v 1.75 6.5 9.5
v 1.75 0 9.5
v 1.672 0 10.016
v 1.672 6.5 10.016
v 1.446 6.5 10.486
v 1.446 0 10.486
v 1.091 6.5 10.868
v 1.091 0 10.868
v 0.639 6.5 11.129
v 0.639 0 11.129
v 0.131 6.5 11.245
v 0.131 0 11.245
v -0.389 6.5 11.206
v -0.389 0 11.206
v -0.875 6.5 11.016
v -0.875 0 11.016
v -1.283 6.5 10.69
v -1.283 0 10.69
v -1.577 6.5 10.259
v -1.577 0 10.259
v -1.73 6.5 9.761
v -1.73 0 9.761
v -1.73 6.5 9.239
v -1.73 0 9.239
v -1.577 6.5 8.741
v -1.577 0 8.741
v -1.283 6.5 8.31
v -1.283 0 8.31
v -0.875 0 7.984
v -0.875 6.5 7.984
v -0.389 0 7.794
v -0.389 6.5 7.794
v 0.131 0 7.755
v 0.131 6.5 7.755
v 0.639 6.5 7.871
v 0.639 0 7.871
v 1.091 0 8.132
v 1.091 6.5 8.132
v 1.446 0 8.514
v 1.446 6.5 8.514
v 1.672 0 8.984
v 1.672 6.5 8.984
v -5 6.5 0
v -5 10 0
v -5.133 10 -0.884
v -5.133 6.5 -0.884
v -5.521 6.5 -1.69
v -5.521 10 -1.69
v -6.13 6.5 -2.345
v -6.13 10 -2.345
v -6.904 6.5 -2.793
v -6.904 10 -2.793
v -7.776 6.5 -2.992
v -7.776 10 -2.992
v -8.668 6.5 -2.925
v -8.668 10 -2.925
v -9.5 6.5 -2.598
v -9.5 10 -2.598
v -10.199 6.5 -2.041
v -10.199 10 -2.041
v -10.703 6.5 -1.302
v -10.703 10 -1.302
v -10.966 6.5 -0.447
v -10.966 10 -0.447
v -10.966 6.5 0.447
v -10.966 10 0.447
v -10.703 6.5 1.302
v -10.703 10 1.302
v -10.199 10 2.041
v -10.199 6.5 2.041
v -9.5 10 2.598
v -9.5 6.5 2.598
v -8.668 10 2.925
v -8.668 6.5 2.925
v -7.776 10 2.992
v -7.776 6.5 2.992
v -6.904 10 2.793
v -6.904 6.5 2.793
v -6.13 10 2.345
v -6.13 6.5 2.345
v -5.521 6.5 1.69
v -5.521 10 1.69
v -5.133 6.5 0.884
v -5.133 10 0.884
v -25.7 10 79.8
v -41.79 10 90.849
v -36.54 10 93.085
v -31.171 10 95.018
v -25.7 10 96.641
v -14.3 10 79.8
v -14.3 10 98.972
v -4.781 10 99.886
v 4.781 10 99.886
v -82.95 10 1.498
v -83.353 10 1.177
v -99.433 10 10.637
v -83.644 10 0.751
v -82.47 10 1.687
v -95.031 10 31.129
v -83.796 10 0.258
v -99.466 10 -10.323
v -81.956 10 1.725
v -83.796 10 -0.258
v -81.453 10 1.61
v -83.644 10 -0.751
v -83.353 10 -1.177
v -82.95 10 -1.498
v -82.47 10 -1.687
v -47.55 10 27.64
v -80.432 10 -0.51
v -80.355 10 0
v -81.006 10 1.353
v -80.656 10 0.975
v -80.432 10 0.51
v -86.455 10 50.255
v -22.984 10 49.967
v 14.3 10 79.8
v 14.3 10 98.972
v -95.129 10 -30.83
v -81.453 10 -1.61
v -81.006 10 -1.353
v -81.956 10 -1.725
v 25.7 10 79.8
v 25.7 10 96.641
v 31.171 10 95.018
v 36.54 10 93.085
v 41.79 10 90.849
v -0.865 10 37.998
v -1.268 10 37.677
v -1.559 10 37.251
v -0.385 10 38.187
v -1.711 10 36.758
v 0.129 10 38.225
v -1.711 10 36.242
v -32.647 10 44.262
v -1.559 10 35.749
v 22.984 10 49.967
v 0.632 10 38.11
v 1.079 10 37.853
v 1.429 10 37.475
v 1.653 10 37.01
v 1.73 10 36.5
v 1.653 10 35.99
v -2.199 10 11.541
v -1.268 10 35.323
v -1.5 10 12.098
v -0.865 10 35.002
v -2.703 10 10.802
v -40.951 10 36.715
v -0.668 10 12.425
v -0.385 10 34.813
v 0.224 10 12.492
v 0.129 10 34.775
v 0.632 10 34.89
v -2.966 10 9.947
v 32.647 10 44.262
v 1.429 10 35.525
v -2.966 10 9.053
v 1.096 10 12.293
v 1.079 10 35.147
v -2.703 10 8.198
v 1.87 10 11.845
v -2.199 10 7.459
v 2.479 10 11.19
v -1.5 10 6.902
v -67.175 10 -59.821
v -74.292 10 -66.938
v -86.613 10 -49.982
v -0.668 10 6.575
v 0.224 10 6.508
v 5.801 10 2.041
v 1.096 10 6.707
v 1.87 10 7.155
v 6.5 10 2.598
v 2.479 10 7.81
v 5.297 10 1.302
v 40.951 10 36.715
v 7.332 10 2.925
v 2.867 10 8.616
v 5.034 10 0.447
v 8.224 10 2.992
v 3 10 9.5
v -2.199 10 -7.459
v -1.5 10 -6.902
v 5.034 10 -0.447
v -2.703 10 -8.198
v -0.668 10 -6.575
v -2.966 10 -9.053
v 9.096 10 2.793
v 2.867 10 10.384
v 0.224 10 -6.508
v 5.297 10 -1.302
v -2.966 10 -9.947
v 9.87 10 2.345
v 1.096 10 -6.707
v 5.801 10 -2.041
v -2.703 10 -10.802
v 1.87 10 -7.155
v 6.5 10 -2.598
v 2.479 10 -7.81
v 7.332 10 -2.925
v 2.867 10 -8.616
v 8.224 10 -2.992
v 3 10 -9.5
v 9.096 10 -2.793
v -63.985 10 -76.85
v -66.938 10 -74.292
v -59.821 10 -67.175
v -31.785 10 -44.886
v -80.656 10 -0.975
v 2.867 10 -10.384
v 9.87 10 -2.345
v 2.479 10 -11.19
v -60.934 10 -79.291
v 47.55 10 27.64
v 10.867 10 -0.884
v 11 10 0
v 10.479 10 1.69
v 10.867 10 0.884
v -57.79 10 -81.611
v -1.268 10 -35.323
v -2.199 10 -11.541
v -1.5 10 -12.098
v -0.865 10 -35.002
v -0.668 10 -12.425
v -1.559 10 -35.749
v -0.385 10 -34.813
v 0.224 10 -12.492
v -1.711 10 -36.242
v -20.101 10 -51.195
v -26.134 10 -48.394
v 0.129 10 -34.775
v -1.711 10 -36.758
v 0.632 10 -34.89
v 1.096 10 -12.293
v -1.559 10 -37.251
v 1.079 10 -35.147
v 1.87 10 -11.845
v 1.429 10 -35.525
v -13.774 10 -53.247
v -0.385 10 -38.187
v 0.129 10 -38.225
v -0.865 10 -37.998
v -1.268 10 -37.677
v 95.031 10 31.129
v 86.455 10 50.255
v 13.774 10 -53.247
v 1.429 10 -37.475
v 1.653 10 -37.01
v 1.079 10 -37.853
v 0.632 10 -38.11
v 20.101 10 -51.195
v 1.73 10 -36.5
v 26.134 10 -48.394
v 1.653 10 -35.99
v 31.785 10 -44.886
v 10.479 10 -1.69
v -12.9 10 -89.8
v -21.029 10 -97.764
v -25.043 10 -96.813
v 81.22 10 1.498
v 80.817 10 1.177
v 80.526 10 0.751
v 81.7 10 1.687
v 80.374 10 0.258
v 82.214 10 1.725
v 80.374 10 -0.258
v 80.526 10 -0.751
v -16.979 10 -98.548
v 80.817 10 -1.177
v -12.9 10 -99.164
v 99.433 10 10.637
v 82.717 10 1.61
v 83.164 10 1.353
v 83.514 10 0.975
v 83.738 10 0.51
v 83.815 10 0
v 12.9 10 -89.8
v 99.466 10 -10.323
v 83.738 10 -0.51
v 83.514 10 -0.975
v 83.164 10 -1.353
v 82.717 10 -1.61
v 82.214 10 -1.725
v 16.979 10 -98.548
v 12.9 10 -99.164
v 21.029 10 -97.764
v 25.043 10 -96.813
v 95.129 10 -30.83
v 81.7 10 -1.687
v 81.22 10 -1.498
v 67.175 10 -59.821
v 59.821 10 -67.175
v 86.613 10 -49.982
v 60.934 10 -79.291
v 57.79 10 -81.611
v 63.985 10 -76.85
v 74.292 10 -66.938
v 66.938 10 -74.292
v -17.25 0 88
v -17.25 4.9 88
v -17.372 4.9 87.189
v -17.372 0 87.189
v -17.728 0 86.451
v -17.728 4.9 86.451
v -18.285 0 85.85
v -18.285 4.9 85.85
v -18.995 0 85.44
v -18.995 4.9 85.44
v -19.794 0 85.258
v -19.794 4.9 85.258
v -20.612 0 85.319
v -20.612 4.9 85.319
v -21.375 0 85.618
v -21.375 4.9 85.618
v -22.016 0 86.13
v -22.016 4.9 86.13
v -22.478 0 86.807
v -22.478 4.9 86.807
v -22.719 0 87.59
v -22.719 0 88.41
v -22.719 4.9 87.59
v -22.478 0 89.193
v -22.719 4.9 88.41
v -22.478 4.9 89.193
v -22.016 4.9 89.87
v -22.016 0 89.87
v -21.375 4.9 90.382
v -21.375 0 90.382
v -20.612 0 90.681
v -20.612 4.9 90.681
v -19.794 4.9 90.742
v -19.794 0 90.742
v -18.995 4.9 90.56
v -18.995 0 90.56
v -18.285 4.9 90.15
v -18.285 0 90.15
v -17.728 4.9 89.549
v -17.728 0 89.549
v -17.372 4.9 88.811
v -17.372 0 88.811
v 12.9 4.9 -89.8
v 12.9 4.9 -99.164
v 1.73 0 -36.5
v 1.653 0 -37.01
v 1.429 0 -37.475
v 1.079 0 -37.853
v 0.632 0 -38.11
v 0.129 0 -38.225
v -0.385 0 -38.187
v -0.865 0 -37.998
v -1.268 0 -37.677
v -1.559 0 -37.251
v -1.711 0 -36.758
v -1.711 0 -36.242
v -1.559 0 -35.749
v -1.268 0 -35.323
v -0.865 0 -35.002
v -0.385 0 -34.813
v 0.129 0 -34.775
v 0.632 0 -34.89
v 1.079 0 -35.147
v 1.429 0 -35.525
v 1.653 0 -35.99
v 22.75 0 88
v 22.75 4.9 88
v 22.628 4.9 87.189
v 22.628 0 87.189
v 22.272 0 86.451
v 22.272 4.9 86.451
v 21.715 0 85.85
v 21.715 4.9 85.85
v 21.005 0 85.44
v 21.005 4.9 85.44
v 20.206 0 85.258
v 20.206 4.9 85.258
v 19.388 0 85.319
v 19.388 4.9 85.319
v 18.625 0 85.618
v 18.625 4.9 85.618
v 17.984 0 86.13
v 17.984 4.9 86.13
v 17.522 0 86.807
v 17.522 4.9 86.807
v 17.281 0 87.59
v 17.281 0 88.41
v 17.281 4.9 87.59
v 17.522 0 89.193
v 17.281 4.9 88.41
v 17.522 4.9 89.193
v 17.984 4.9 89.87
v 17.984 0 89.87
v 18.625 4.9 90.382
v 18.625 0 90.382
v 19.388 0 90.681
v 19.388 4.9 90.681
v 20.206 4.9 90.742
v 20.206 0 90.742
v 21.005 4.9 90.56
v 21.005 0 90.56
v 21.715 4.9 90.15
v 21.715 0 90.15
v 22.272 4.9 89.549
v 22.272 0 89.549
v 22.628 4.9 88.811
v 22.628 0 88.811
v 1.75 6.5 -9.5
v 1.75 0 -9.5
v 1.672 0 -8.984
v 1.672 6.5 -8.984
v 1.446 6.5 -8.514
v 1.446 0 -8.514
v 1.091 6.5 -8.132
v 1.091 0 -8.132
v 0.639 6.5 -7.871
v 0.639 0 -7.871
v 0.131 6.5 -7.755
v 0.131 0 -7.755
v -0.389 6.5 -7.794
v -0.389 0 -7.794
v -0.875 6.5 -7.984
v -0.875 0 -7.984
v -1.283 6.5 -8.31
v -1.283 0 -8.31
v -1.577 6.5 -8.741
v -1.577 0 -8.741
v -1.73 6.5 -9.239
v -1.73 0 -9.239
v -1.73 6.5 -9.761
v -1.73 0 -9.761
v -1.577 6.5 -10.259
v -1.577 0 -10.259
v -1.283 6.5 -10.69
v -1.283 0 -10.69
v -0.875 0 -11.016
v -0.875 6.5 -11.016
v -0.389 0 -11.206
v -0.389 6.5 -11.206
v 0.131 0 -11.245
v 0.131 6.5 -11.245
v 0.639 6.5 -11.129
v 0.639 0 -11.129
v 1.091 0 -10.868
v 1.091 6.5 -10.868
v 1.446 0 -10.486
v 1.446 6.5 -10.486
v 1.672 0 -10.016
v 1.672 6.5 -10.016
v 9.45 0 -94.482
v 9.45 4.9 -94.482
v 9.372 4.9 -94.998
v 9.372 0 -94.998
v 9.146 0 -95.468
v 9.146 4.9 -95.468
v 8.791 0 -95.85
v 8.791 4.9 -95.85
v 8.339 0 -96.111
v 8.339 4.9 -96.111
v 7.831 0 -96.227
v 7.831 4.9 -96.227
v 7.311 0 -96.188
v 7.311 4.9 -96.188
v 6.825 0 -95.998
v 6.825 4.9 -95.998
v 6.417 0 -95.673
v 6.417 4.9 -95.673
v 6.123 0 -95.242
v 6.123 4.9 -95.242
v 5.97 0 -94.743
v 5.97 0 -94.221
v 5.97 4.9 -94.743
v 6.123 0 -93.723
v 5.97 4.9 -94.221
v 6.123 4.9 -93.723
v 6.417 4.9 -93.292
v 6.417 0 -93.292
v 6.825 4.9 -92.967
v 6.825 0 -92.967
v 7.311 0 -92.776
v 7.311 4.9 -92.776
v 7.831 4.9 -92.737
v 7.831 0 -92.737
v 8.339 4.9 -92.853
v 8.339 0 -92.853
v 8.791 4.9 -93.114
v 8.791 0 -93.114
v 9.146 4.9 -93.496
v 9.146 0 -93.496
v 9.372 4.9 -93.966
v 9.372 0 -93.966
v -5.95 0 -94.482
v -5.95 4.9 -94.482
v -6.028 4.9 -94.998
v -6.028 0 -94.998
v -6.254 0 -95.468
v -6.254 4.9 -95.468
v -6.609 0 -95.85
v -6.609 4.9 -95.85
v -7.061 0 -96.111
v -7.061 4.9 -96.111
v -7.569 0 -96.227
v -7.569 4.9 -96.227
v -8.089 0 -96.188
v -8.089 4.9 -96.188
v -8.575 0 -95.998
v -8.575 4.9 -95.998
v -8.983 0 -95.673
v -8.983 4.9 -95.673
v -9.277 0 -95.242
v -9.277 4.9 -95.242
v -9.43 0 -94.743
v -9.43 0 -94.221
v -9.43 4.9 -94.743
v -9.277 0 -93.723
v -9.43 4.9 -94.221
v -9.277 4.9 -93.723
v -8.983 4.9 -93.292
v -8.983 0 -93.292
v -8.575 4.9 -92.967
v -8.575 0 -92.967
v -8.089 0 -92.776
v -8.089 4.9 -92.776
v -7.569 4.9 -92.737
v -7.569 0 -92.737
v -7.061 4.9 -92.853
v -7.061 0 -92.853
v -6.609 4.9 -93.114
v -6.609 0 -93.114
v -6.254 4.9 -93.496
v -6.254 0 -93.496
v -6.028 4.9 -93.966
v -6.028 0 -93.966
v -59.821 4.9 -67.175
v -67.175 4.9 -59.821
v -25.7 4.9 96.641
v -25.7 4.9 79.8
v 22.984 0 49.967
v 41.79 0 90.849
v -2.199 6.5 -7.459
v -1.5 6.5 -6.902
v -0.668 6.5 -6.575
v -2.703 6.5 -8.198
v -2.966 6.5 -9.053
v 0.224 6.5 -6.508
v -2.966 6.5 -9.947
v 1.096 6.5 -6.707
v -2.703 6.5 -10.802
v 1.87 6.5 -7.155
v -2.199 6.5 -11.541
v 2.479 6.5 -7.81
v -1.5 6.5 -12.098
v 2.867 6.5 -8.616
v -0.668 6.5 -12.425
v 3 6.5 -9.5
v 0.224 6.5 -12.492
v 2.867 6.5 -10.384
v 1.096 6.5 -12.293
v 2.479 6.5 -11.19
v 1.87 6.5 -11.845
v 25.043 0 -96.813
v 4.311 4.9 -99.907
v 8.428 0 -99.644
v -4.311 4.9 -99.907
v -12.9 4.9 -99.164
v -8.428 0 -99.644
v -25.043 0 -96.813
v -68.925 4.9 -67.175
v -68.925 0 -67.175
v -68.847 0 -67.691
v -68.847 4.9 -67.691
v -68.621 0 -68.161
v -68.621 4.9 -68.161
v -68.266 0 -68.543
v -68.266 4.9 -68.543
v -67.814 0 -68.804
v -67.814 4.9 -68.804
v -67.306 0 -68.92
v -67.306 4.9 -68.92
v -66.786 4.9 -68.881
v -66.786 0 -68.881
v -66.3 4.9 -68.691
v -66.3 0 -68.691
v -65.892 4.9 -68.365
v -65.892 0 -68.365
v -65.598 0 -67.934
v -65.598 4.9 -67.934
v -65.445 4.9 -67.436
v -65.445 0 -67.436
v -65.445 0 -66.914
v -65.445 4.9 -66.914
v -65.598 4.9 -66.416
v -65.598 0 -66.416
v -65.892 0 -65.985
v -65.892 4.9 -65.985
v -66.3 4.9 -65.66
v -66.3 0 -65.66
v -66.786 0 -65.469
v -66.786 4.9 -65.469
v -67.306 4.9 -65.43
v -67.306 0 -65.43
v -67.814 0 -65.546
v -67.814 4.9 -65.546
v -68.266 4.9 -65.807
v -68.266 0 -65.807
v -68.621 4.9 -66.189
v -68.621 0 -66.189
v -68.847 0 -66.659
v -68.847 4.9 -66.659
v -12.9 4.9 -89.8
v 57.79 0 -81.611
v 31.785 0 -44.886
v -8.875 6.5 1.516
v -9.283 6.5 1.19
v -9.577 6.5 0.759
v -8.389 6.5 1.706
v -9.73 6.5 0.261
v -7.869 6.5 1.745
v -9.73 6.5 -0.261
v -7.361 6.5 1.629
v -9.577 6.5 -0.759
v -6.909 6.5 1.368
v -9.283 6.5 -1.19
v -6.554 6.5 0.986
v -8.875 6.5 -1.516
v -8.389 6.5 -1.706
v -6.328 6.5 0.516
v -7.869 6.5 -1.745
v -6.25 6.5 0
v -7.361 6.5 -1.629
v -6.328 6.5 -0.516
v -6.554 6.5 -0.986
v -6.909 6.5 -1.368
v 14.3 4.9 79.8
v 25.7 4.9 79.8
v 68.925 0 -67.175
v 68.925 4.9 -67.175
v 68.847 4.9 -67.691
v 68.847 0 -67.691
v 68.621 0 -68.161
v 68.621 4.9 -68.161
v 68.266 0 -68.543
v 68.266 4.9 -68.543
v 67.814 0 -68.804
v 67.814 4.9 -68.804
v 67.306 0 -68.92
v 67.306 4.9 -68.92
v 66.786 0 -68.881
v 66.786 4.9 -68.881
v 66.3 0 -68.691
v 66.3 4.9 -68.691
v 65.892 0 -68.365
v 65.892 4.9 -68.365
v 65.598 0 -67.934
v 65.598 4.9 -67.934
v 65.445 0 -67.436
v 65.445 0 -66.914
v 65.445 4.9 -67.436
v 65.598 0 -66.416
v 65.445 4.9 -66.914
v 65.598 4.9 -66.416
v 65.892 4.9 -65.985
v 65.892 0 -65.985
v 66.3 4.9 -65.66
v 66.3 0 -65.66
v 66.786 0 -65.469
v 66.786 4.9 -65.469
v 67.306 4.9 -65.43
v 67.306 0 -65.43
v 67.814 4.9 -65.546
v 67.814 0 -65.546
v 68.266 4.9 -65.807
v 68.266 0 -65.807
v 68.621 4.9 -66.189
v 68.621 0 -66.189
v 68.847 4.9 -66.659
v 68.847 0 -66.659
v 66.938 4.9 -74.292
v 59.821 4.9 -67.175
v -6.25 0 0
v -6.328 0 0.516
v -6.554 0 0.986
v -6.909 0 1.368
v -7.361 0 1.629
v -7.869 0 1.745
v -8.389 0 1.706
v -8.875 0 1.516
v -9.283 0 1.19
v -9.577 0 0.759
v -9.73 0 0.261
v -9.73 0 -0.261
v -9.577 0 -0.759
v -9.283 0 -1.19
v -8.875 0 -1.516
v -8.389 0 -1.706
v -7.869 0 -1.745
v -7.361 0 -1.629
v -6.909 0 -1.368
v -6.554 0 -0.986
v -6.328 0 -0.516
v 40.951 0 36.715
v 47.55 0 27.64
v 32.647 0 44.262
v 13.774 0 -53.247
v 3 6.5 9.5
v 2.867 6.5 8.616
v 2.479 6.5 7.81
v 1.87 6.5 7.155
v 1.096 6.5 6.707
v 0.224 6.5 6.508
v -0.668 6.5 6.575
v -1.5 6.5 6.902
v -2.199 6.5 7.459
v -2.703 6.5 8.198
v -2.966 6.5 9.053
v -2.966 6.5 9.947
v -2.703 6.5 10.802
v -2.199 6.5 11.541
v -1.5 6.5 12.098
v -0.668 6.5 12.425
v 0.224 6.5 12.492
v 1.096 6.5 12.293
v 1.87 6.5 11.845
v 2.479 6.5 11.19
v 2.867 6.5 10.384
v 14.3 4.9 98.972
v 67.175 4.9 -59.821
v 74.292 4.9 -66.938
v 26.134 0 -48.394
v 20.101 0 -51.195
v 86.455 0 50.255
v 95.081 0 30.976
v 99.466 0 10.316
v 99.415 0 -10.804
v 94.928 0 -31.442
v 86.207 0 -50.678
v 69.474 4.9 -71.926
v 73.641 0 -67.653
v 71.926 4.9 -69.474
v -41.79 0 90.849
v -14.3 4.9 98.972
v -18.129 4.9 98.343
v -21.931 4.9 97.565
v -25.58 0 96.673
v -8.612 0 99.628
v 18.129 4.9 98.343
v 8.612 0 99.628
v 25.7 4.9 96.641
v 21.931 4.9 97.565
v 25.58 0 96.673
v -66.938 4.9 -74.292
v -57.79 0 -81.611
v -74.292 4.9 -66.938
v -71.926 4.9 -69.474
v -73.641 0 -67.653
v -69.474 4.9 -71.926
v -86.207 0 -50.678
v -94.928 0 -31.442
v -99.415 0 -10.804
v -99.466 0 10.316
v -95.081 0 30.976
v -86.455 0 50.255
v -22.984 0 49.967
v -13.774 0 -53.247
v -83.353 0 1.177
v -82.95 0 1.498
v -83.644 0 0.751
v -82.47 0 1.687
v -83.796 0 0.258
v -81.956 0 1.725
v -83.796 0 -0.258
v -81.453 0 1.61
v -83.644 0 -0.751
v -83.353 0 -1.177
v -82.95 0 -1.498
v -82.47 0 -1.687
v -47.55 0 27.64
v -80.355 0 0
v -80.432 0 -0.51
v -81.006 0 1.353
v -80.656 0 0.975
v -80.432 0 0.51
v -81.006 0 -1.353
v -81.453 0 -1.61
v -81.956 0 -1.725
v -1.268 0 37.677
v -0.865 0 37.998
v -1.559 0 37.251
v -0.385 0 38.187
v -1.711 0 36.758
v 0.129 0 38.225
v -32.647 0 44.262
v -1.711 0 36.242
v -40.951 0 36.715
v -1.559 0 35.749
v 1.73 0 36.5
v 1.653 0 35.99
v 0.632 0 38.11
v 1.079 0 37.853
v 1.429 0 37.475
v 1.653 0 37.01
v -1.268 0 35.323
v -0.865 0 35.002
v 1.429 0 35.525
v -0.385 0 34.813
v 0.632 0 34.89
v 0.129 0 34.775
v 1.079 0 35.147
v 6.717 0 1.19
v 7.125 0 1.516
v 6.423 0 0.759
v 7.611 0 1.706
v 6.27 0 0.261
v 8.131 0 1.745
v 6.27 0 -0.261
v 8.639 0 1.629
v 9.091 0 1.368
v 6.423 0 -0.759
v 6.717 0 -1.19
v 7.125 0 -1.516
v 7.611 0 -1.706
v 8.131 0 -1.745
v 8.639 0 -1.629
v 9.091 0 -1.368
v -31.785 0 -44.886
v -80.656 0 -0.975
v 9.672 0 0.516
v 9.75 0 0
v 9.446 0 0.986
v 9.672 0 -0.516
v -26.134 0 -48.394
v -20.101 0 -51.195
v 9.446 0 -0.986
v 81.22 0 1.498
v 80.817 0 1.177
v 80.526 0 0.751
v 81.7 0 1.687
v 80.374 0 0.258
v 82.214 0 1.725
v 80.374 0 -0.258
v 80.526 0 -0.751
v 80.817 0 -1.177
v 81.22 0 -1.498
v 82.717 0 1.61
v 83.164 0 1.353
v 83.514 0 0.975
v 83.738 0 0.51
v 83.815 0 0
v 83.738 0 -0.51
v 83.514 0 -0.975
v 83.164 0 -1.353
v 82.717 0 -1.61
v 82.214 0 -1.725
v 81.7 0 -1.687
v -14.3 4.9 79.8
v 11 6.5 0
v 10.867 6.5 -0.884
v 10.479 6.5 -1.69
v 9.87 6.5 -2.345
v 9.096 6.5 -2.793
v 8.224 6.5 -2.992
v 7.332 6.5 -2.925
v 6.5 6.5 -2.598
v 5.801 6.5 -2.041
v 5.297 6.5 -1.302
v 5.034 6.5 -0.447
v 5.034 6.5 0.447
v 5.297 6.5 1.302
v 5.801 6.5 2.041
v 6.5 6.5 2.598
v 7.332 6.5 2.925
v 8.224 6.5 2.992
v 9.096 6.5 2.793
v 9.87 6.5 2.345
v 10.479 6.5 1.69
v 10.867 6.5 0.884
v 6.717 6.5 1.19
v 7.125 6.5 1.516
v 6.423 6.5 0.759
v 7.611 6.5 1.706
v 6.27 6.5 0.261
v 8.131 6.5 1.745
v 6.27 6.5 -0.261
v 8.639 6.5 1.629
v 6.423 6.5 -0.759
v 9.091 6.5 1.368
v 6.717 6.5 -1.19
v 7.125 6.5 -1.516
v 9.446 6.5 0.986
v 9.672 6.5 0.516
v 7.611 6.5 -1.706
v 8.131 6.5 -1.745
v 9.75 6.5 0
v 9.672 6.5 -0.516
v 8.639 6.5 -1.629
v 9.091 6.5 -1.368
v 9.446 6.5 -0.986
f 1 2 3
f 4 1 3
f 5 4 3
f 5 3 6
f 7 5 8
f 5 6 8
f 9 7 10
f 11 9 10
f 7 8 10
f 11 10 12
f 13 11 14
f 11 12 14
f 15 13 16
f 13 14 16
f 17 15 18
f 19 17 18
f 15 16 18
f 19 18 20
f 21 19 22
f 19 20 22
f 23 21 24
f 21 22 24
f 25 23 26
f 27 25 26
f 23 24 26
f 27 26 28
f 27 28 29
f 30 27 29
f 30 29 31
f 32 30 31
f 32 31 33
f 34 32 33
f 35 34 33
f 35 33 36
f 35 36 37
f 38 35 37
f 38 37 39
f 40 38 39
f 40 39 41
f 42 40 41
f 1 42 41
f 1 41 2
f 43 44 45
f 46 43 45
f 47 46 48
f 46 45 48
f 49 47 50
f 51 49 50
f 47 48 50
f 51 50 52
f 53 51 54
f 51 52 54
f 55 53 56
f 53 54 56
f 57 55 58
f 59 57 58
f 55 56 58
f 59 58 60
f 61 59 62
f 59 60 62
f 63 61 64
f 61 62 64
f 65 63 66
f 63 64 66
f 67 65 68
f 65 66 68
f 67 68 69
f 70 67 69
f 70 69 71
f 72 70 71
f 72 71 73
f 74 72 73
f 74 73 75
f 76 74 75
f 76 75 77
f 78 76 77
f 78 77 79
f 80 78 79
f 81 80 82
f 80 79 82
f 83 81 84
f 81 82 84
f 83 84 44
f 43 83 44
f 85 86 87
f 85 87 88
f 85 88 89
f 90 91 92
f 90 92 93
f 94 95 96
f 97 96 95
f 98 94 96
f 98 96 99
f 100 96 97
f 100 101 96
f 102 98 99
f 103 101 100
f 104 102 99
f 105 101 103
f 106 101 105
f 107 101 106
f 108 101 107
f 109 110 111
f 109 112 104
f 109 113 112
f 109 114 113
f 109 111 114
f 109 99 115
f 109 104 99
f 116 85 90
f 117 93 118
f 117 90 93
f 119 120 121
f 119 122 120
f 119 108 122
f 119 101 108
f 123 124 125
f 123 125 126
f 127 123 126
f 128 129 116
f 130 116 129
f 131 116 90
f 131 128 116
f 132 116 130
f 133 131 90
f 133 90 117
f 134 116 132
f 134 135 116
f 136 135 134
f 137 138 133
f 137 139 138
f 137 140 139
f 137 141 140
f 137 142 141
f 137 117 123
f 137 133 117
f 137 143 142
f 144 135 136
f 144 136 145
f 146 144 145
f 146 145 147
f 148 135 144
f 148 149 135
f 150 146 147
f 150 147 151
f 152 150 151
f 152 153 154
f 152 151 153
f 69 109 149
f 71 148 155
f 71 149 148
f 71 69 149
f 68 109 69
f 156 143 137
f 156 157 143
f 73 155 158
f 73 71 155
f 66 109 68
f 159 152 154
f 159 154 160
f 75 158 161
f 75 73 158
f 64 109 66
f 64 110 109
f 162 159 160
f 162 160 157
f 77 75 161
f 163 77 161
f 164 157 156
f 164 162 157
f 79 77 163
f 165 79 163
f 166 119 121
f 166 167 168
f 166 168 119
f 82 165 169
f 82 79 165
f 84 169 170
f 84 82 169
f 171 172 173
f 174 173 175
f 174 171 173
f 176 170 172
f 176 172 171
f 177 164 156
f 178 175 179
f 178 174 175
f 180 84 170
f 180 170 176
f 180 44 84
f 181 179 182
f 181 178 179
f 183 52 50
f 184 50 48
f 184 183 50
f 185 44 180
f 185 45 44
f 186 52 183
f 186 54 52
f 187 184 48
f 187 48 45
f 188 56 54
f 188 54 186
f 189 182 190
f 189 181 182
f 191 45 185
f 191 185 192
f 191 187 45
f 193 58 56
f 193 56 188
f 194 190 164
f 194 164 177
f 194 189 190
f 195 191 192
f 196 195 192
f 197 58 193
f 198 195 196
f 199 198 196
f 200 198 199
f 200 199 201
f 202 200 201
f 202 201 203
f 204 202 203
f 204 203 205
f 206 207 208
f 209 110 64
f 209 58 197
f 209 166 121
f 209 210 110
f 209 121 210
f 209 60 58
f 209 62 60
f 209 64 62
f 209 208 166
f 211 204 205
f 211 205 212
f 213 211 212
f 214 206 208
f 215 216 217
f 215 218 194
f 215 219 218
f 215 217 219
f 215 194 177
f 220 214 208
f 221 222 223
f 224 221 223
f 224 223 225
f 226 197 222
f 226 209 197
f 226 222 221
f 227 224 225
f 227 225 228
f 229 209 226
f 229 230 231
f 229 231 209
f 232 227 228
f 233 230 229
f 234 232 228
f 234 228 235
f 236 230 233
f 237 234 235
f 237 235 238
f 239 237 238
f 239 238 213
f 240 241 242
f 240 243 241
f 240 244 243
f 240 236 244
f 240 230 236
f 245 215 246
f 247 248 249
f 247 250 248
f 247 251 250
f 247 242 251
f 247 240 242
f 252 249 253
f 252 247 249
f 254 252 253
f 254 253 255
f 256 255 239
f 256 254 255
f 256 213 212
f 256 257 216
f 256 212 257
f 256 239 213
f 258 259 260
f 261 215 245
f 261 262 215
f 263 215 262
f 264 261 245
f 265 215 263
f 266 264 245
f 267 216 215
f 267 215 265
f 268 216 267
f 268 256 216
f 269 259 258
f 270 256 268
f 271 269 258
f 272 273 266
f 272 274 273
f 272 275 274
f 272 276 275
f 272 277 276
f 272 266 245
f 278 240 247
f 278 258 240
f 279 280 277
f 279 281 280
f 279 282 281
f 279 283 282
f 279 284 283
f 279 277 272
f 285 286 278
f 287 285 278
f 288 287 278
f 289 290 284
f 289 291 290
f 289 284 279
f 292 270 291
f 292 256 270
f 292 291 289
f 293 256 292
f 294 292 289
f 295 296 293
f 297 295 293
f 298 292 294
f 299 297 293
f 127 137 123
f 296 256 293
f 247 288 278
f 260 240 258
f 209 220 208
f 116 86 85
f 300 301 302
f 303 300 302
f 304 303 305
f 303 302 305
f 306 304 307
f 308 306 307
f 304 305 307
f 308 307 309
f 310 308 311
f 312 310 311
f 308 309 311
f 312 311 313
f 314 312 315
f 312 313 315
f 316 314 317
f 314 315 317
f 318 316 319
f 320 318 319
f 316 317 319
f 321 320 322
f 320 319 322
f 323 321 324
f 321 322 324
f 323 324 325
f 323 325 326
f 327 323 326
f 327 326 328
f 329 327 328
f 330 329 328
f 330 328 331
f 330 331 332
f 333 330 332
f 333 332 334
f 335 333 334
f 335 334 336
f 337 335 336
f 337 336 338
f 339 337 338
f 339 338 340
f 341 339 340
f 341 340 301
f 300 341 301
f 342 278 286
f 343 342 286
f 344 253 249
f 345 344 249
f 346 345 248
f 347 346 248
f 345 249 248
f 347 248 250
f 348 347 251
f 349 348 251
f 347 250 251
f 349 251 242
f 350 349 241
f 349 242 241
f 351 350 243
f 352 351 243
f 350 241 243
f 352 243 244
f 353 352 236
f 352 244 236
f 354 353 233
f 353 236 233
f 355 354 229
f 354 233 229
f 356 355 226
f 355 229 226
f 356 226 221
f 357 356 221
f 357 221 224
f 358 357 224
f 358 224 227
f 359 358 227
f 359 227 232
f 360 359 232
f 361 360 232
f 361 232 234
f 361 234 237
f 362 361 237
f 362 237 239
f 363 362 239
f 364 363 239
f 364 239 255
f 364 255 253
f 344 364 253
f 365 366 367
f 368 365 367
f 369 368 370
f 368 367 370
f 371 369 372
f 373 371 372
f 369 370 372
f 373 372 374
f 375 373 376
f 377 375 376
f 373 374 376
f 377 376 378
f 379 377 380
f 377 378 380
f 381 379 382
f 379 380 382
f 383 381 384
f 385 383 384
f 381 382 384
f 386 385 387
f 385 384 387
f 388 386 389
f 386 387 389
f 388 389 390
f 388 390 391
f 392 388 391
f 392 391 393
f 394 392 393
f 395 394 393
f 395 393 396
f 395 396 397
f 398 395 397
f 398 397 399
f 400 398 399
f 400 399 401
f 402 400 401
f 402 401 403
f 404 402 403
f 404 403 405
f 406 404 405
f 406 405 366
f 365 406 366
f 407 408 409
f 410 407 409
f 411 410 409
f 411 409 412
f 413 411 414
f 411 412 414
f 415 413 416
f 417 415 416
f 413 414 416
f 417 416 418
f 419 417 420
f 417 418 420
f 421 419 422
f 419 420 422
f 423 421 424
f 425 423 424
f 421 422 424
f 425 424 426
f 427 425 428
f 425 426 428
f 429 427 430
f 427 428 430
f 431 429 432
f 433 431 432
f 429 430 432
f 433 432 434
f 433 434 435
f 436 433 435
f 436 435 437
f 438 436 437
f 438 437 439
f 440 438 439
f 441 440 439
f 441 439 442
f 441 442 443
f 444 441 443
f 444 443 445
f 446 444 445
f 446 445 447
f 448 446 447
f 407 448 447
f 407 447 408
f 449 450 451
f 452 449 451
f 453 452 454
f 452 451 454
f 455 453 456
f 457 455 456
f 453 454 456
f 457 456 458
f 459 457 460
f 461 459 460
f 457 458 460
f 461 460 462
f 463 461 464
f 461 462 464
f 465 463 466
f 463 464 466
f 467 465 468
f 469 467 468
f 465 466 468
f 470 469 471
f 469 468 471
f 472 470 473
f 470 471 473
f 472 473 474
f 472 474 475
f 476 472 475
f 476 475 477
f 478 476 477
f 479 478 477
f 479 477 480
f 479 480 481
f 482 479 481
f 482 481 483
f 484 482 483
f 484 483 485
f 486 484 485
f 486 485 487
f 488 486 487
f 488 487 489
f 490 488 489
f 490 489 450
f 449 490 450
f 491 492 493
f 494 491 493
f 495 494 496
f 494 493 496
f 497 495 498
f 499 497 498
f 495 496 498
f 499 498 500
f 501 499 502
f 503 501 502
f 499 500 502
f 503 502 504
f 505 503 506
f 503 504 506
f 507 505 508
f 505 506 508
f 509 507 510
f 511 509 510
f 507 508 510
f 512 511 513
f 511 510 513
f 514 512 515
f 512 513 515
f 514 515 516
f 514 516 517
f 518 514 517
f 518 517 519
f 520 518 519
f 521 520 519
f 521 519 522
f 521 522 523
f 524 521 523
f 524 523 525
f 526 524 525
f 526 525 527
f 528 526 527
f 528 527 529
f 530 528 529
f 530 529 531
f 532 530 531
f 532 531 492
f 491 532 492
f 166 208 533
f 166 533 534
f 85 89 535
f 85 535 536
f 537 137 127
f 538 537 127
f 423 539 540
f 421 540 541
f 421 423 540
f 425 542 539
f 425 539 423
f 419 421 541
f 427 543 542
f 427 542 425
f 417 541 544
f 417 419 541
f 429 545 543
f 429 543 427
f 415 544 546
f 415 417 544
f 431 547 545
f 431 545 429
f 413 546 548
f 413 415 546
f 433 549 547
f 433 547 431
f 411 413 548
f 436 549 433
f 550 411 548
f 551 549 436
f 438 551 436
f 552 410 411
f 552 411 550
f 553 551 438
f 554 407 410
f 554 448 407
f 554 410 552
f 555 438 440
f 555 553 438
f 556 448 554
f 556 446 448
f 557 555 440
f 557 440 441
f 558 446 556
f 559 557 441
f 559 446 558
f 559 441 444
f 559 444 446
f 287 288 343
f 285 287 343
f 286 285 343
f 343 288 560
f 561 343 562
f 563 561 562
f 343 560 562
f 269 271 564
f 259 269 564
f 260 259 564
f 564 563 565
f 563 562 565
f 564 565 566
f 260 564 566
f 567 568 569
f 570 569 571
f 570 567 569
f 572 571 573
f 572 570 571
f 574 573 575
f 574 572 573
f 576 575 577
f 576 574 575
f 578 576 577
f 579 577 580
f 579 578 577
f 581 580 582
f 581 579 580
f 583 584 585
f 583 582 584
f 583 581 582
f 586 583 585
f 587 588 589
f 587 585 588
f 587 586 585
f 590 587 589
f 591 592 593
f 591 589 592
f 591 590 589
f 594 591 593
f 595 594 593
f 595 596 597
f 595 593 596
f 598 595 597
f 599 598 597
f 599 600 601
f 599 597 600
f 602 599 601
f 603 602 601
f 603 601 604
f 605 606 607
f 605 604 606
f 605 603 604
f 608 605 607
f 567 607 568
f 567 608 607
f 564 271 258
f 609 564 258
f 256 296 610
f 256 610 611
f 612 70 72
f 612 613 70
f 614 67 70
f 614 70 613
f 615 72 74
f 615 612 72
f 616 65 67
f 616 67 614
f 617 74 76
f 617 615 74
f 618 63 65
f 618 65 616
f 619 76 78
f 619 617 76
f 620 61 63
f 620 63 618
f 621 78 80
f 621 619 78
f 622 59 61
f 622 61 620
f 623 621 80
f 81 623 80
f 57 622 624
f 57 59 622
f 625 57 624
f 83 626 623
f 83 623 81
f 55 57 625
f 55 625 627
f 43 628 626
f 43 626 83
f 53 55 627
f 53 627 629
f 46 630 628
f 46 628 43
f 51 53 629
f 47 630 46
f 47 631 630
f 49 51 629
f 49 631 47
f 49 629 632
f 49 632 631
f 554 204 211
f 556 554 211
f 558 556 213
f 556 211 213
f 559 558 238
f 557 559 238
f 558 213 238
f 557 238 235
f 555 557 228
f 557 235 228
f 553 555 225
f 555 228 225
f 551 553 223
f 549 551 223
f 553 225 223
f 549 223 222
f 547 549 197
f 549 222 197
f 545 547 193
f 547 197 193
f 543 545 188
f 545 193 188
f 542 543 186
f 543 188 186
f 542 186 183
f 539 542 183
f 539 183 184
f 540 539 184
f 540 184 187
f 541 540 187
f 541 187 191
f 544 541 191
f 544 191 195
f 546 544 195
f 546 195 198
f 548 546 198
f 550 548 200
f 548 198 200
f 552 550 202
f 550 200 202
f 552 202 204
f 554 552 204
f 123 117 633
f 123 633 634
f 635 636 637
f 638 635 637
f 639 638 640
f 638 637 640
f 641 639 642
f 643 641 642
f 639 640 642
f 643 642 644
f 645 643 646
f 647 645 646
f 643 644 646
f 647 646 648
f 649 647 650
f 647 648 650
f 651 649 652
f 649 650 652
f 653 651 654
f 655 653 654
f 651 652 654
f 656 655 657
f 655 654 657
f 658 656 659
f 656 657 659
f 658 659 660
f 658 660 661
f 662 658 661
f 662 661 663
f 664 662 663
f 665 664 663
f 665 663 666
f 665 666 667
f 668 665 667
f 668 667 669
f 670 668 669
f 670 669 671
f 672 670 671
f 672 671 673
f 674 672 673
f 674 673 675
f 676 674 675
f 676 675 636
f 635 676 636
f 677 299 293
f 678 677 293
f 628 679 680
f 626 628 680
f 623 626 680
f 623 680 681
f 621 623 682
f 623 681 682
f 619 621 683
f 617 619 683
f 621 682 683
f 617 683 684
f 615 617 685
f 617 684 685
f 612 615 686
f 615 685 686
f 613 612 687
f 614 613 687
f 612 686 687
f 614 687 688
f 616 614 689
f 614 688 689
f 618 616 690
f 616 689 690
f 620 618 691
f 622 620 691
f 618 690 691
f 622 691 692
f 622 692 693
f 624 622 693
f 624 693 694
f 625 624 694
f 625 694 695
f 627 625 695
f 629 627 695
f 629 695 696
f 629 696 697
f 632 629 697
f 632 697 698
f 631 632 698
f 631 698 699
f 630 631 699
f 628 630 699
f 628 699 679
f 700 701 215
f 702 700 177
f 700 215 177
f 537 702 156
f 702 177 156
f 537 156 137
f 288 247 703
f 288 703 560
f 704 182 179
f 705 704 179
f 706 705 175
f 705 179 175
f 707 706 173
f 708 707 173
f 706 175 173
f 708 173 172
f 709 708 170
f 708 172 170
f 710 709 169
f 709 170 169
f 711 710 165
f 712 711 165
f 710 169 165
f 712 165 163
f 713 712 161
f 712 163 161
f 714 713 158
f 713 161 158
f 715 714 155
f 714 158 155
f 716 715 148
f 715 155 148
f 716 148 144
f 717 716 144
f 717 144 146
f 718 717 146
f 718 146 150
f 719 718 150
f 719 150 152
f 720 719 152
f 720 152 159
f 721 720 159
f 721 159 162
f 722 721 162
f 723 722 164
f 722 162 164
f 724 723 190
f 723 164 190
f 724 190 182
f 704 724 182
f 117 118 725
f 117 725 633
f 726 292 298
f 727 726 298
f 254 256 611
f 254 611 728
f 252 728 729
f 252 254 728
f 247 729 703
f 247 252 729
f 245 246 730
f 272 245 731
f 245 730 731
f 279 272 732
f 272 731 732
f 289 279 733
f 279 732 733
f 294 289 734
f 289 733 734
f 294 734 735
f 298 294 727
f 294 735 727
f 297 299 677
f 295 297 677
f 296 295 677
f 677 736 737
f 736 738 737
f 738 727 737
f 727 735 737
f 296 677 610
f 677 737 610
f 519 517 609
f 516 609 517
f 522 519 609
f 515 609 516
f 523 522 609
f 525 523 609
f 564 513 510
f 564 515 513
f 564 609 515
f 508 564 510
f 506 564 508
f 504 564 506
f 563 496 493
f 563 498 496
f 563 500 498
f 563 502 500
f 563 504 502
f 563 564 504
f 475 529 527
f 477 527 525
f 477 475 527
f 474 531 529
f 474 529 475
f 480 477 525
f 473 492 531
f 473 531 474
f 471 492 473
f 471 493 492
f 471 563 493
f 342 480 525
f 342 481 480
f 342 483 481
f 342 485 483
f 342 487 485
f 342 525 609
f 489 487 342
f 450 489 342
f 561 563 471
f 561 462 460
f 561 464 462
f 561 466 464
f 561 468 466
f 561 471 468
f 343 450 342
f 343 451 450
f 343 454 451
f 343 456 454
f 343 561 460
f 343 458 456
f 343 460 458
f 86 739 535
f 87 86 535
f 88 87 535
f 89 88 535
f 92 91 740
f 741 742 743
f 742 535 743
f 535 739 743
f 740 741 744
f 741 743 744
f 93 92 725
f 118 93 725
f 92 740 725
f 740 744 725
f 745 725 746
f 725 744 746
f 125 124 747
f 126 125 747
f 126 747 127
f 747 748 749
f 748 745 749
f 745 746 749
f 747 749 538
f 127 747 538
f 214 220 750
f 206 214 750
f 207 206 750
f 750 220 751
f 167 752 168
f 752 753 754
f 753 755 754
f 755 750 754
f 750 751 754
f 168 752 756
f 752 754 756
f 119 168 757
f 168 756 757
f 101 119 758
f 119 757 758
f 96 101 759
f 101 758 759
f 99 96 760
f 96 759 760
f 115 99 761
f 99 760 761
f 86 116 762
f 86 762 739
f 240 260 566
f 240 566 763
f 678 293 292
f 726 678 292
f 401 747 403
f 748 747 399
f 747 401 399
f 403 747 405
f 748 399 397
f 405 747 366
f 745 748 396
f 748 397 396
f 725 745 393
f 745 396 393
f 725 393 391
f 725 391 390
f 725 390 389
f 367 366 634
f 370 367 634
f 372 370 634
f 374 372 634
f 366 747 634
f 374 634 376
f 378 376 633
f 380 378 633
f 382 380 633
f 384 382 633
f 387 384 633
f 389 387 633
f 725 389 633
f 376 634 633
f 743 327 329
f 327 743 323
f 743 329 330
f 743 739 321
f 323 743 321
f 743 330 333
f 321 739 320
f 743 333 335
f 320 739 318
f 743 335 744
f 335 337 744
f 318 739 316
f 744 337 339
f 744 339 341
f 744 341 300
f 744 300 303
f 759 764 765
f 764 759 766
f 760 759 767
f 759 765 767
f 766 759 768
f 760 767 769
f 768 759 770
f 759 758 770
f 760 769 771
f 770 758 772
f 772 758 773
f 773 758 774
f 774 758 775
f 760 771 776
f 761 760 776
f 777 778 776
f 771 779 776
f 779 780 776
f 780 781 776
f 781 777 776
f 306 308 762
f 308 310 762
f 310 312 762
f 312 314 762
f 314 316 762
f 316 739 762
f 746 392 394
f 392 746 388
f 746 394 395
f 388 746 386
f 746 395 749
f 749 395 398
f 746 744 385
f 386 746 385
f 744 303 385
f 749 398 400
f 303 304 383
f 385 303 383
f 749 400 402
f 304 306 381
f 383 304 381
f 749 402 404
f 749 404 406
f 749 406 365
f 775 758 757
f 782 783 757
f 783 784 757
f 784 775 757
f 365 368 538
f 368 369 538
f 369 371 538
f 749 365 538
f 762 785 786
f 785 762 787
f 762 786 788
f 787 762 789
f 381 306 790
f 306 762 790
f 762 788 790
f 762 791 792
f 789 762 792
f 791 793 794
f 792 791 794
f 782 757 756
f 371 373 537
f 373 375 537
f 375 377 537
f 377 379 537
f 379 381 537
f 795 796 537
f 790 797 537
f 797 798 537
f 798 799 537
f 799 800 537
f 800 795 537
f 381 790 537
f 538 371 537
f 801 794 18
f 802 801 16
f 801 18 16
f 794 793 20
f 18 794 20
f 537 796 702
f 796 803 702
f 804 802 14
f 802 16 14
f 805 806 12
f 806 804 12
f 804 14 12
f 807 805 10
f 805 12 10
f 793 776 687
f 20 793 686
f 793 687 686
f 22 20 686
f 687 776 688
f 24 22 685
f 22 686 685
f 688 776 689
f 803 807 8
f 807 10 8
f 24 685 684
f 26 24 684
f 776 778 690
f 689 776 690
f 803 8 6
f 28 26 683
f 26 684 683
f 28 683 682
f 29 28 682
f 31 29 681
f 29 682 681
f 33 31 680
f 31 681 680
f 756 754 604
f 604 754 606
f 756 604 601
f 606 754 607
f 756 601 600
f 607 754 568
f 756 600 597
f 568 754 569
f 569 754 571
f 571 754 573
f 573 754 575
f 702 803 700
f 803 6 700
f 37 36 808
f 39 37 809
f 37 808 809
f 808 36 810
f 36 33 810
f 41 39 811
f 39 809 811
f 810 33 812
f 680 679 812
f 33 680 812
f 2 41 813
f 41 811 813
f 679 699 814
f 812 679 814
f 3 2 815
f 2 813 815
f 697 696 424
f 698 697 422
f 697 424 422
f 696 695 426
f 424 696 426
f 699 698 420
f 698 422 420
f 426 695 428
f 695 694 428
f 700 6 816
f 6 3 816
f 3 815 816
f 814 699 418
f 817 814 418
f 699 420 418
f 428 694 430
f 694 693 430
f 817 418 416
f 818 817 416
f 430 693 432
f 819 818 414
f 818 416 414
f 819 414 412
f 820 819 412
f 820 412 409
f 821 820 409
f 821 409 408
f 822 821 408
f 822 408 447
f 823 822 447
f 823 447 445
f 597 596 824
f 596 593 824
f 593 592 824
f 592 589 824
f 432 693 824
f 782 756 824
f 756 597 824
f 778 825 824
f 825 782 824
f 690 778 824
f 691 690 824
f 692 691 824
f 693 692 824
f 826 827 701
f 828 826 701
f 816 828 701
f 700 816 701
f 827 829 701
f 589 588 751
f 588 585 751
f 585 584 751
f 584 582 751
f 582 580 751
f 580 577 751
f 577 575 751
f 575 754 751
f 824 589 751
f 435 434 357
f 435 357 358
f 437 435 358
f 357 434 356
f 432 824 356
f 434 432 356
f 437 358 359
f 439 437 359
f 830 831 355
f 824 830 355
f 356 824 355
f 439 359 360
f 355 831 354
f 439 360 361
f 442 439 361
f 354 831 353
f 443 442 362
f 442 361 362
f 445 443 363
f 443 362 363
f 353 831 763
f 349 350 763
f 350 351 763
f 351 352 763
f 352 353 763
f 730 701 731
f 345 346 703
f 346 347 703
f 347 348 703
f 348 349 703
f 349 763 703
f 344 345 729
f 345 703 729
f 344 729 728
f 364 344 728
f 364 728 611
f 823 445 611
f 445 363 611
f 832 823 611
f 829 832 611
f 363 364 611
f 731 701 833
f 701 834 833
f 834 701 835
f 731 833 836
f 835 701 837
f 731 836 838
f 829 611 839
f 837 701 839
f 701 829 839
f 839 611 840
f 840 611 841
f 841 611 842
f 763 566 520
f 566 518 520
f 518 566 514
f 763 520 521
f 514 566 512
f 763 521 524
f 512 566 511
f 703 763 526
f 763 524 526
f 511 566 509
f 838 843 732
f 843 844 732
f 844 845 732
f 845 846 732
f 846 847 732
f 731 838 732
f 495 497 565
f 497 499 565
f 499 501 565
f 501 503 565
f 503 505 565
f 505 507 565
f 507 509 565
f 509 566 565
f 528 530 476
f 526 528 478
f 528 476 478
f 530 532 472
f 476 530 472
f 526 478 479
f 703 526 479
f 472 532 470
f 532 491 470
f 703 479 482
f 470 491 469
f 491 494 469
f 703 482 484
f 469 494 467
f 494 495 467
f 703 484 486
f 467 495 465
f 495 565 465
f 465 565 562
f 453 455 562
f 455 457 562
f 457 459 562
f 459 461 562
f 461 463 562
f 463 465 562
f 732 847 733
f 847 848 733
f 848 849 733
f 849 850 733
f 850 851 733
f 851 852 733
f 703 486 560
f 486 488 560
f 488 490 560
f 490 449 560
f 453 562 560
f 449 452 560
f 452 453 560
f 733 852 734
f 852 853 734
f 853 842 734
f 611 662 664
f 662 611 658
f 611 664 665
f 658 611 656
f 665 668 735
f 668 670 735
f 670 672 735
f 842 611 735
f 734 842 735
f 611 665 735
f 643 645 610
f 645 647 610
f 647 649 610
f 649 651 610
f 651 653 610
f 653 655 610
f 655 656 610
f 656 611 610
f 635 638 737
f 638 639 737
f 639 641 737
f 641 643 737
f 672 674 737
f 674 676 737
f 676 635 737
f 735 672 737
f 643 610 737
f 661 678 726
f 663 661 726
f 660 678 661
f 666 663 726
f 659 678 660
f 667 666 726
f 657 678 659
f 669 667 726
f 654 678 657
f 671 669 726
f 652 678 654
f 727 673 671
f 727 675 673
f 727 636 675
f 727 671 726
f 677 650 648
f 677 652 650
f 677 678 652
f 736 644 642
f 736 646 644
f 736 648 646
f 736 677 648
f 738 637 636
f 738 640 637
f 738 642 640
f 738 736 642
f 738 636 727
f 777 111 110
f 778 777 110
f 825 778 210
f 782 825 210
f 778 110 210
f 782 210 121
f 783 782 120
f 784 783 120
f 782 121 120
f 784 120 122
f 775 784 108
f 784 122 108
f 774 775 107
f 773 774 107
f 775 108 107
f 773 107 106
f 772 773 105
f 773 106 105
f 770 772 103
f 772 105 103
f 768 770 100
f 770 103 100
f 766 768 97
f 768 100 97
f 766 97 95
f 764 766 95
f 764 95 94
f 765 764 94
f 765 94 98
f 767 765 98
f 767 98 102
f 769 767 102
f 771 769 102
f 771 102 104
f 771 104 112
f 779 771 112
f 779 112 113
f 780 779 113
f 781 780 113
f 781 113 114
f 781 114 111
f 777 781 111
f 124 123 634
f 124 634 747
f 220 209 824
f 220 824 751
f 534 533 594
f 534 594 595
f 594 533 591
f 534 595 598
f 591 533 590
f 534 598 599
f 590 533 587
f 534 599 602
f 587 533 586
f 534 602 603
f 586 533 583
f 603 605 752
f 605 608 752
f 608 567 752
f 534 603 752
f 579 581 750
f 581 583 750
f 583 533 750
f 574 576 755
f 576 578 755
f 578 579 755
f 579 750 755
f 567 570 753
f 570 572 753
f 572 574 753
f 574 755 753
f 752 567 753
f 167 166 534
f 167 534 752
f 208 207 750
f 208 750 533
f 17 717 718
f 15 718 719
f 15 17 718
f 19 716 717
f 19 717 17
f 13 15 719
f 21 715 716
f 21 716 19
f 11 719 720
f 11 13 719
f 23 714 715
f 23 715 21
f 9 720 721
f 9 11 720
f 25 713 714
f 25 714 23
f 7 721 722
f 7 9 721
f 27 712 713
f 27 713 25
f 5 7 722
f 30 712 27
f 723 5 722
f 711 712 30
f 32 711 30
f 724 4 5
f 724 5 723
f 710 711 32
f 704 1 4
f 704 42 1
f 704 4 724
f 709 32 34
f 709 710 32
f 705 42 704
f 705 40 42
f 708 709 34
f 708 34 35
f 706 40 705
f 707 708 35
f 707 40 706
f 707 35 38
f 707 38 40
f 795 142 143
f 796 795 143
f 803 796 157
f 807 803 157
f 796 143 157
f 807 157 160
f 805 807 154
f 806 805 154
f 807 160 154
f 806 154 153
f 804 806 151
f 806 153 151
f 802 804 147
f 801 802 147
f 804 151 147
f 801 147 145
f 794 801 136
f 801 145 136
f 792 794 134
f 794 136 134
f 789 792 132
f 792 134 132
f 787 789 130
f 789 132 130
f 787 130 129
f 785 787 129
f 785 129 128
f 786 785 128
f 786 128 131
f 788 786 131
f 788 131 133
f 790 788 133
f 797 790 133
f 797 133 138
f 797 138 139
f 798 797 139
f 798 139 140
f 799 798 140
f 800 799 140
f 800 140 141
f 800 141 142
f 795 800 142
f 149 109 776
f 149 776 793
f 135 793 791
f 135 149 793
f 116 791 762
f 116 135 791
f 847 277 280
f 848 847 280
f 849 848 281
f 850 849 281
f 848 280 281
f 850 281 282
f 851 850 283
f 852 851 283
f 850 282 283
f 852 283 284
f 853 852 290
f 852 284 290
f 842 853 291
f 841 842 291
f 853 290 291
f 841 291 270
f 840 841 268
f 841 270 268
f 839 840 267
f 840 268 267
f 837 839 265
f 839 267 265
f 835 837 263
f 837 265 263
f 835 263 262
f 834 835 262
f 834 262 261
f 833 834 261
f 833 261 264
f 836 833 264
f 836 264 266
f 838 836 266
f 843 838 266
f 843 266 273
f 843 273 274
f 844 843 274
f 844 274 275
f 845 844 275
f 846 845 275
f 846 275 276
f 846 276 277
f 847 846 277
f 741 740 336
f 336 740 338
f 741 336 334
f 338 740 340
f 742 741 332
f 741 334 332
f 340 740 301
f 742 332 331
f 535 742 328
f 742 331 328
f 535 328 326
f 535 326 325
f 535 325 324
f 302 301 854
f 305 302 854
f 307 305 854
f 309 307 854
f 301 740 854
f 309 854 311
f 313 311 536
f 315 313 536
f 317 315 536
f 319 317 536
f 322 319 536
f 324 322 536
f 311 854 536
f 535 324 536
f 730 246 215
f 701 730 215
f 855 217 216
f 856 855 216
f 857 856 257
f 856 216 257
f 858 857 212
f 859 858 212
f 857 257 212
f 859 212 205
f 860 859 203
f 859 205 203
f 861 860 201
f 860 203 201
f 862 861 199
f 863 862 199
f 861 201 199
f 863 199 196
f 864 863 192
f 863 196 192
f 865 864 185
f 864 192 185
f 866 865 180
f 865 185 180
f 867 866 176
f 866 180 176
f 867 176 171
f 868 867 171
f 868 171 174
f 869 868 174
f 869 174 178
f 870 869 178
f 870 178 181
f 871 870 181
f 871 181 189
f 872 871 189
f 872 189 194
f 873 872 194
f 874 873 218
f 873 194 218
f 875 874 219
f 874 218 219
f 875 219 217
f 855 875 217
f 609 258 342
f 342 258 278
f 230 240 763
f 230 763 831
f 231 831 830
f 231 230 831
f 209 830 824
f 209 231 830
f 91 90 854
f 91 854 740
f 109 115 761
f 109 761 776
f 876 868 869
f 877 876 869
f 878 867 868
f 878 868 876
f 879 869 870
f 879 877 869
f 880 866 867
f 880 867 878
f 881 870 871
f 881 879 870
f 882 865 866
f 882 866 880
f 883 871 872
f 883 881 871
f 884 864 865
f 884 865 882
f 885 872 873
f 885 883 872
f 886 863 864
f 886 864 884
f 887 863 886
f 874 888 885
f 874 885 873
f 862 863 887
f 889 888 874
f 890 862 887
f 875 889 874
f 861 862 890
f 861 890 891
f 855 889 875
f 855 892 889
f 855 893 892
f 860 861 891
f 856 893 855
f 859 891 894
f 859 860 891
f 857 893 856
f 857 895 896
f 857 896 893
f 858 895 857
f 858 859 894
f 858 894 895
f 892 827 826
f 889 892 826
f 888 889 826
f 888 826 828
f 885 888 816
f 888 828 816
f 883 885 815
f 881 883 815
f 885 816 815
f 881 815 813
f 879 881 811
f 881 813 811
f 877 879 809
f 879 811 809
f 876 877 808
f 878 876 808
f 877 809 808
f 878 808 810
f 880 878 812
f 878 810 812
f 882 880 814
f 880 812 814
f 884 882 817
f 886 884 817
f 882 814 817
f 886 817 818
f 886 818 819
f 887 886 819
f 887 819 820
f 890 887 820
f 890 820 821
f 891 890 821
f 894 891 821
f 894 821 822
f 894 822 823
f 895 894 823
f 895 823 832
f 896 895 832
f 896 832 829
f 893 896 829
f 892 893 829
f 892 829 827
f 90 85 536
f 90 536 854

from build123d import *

# Parameters (mm, degrees)
SKETCH1_R           = 100
BOSS_EXTRUDE1_DEPTH = 10
SKETCH4_R           = 1.73
CUT_EXTRUDE2_DEPTH  = 11
SKETCH6_R           = 1.75
CUT_EXTRUDE3_DEPTH  = 10
SKETCH7_R           = 3
CUT_EXTRUDE4_DEPTH  = 3.5
CUT_EXTRUDE5_DEPTH  = 5.1
CUT_EXTRUDE6_DEPTH  = 5.1
SKETCH10_R          = 1.75
CUT_EXTRUDE7_DEPTH  = 5.9
CUT_EXTRUDE9_DEPTH  = 5.1
SKETCH13_R          = 1.75
CUT_EXTRUDE10_DEPTH = 5.9
CUT_EXTRUDE11_DEPTH = 11
CUT_EXTRUDE12_DEPTH = 11
SKETCH18_R          = 2.75
CUT_EXTRUDE13_DEPTH = 5.9


with BuildPart() as part:
    # Sketch1 → Boss-Extrude1 (new body)
    with BuildSketch(Plane(origin=(0, 0, 0), x_dir=(1, 0, 0), z_dir=(0, 1, 0))):
        Circle(SKETCH1_R)
    extrude(amount=BOSS_EXTRUDE1_DEPTH)

    # Sketch4 → Cut-Extrude2 (cut, through all)
    with BuildSketch(Plane(origin=(0, 10, 0), x_dir=(1, 0, 0), z_dir=(0, 1, 0))):
        with Locations((-82.085, 0)):
            Circle(SKETCH4_R)
        with Locations((0, -36.5)):
            Circle(SKETCH4_R)
        with Locations((82.085, 0)):
            Circle(SKETCH4_R)
        with Locations((0, 36.5)):
            Circle(SKETCH4_R)
    extrude(amount=-CUT_EXTRUDE2_DEPTH, mode=Mode.SUBTRACT)

    # Sketch6 → Cut-Extrude3 (cut)
    with BuildSketch(Plane.XZ):
        with Locations((8, 0)):
            Circle(SKETCH6_R)
        with Locations((0, 9.5)):
            Circle(SKETCH6_R)
        with Locations((-8, 0)):
            Circle(SKETCH6_R)
        with Locations((0, -9.5)):
            Circle(SKETCH6_R)
    extrude(amount=-CUT_EXTRUDE3_DEPTH, mode=Mode.SUBTRACT)

    # Sketch7 → Cut-Extrude4 (cut)
    with BuildSketch(Plane(origin=(0, 10, 0), x_dir=(1, 0, 0), z_dir=(0, 1, 0))):
        with Locations((0, 9.5)):
            Circle(SKETCH7_R)
        with Locations((-8, 0)):
            Circle(SKETCH7_R)
        with Locations((0, -9.5)):
            Circle(SKETCH7_R)
        with Locations((8, 0)):
            Circle(SKETCH7_R)
    extrude(amount=-CUT_EXTRUDE4_DEPTH, mode=Mode.SUBTRACT)

    # Sketch8 → Cut-Extrude5 (cut)
    with BuildSketch(Plane(origin=(0, 10, 0), x_dir=(1, 0, 0), z_dir=(0, 1, 0))):
        with BuildLine():
            Line((-14.3, -79.8), (-14.3, -99.17434144))
            ThreePointArc((-14.3, -99.17434144), (-20.033793367, -98.17681561), (-25.7, -96.848076904))
            Line((-25.7, -96.848076904), (-25.7, -79.8))
            Line((-25.7, -79.8), (-14.3, -79.8))
        make_face()
        with BuildLine():
            Line((25.7, -79.8), (25.7, -96.848076904))
            ThreePointArc((25.7, -96.848076904), (20.033793367, -98.17681561), (14.3, -99.17434144))
            Line((14.3, -99.17434144), (14.3, -79.8))
            Line((14.3, -79.8), (25.7, -79.8))
        make_face()
    extrude(amount=-CUT_EXTRUDE5_DEPTH, mode=Mode.SUBTRACT)

    # Sketch9 → Cut-Extrude6 (cut)
    with BuildSketch(Plane(origin=(0, 10, 0), x_dir=(1, 0, 0), z_dir=(0, 1, 0))):
        with BuildLine():
            Line((-12.9, 99.164459359), (-12.9, 89.8))
            Line((-12.9, 89.8), (12.9, 89.8))
            Line((12.9, 89.8), (12.9, 99.164459359))
            ThreePointArc((12.9, 99.164459359), (0, 100), (-12.9, 99.164459359))
        make_face()
    extrude(amount=-CUT_EXTRUDE6_DEPTH, mode=Mode.SUBTRACT)

    # Sketch10 → Cut-Extrude7 (cut, through all)
    with BuildSketch(Plane(origin=(0, 4.9, 0), x_dir=(1, 0, 0), z_dir=(0, 1, 0))):
        with Locations((-7.7, 94.48222968)):
            Circle(SKETCH10_R)
        with Locations((7.7, 94.48222968)):
            Circle(SKETCH10_R)
    extrude(amount=-CUT_EXTRUDE7_DEPTH, mode=Mode.SUBTRACT)

    # Sketch12 → Cut-Extrude9 (cut)
    with BuildSketch(Plane(origin=(0, 10, 0), x_dir=(1, 0, 0), z_dir=(0, 1, 0))):
        with BuildLine():
            Line((67.079669869, 74.433580394), (59.821233688, 67.175144213))
            Line((59.821233688, 67.175144213), (67.175144213, 59.821233688))
            Line((67.175144213, 59.821233688), (74.433580394, 67.079669869))
            ThreePointArc((74.433580394, 67.079669869), (70.852099475, 70.852099475), (67.079669869, 74.433580394))
        make_face()
    cut_extrude9 = extrude(amount=-CUT_EXTRUDE9_DEPTH, mode=Mode.SUBTRACT)

    # Sketch13 → Cut-Extrude10 (cut, through all)
    with BuildSketch(Plane(origin=(0, 4.9, 0), x_dir=(1, 0, 0), z_dir=(0, 1, 0))):
        with Locations((67.175144213, 67.175144213)):
            Circle(SKETCH13_R)
    cut_extrude10 = extrude(amount=-CUT_EXTRUDE10_DEPTH, mode=Mode.SUBTRACT)

    # Mirror1: Cut-Extrude9, Cut-Extrude10 across plane
    add(cut_extrude9.mirror(Plane(origin=(0, 0, 0), x_dir=(0, 0, 1), z_dir=(1, 0, 0))), mode=Mode.SUBTRACT)
    add(cut_extrude10.mirror(Plane(origin=(0, 0, 0), x_dir=(0, 0, 1), z_dir=(1, 0, 0))), mode=Mode.SUBTRACT)

    # Sketch15 → Cut-Extrude11 (cut, through all)
    with BuildSketch(Plane(origin=(0, 10, 0), x_dir=(1, 0, 0), z_dir=(0, 1, 0))):
        with BuildLine():
            Line((-22.984410516, -49.967157946), (-41.789837303, -90.849378084))
            ThreePointArc((-41.789837303, -90.849378084), (-67.258268931, -74.002197673), (-86.455078863, -50.254545455))
            Line((-86.455078863, -50.254545455), (-47.550293374, -27.64))
            ThreePointArc((-47.550293374, -27.64), (-36.992047912, -40.70120872), (-22.984410516, -49.967157946))
        make_face()
        with BuildLine():
            Line((22.984410516, -49.967157946), (41.789837303, -90.849378084))
            ThreePointArc((41.789837303, -90.849378084), (67.258268931, -74.002197673), (86.455078863, -50.254545455))
            Line((86.455078863, -50.254545455), (47.550293374, -27.64))
            ThreePointArc((47.550293374, -27.64), (36.992047912, -40.70120872), (22.984410516, -49.967157946))
        make_face()
    extrude(amount=-CUT_EXTRUDE11_DEPTH, mode=Mode.SUBTRACT)

    # Sketch17 → Cut-Extrude12 (cut, through all)
    with BuildSketch(Plane(origin=(0, 10, 0), x_dir=(1, 0, 0), z_dir=(0, 1, 0))):
        with BuildLine():
            Line((-31.784523452, 44.885900558), (-57.79004264, 81.610728288))
            ThreePointArc((-57.79004264, 81.610728288), (-42.108464674, 90.7021345), (-25.043347605, 96.813381))
            Line((-25.043347605, 96.813381), (-13.773841183, 53.24735955))
            ThreePointArc((-13.773841183, 53.24735955), (-23.159655571, 49.886173975), (-31.784523452, 44.885900558))
        make_face()
        with BuildLine():
            Line((13.773841183, 53.24735955), (25.043347605, 96.813381))
            ThreePointArc((25.043347605, 96.813381), (42.108464674, 90.7021345), (57.79004264, 81.610728288))
            Line((57.79004264, 81.610728288), (31.784523452, 44.885900558))
            ThreePointArc((31.784523452, 44.885900558), (23.159655571, 49.886173975), (13.773841183, 53.24735955))
        make_face()
    extrude(amount=-CUT_EXTRUDE12_DEPTH, mode=Mode.SUBTRACT)

    # Sketch18 → Cut-Extrude13 (cut, through all)
    with BuildSketch(Plane(origin=(0, 4.9, 0), x_dir=(1, 0, 0), z_dir=(0, 1, 0))):
        with Locations((-20, -88)):
            Circle(SKETCH18_R)
        with Locations((20, -88)):
            Circle(SKETCH18_R)
    extrude(amount=-CUT_EXTRUDE13_DEPTH, mode=Mode.SUBTRACT)


solid = part.part
